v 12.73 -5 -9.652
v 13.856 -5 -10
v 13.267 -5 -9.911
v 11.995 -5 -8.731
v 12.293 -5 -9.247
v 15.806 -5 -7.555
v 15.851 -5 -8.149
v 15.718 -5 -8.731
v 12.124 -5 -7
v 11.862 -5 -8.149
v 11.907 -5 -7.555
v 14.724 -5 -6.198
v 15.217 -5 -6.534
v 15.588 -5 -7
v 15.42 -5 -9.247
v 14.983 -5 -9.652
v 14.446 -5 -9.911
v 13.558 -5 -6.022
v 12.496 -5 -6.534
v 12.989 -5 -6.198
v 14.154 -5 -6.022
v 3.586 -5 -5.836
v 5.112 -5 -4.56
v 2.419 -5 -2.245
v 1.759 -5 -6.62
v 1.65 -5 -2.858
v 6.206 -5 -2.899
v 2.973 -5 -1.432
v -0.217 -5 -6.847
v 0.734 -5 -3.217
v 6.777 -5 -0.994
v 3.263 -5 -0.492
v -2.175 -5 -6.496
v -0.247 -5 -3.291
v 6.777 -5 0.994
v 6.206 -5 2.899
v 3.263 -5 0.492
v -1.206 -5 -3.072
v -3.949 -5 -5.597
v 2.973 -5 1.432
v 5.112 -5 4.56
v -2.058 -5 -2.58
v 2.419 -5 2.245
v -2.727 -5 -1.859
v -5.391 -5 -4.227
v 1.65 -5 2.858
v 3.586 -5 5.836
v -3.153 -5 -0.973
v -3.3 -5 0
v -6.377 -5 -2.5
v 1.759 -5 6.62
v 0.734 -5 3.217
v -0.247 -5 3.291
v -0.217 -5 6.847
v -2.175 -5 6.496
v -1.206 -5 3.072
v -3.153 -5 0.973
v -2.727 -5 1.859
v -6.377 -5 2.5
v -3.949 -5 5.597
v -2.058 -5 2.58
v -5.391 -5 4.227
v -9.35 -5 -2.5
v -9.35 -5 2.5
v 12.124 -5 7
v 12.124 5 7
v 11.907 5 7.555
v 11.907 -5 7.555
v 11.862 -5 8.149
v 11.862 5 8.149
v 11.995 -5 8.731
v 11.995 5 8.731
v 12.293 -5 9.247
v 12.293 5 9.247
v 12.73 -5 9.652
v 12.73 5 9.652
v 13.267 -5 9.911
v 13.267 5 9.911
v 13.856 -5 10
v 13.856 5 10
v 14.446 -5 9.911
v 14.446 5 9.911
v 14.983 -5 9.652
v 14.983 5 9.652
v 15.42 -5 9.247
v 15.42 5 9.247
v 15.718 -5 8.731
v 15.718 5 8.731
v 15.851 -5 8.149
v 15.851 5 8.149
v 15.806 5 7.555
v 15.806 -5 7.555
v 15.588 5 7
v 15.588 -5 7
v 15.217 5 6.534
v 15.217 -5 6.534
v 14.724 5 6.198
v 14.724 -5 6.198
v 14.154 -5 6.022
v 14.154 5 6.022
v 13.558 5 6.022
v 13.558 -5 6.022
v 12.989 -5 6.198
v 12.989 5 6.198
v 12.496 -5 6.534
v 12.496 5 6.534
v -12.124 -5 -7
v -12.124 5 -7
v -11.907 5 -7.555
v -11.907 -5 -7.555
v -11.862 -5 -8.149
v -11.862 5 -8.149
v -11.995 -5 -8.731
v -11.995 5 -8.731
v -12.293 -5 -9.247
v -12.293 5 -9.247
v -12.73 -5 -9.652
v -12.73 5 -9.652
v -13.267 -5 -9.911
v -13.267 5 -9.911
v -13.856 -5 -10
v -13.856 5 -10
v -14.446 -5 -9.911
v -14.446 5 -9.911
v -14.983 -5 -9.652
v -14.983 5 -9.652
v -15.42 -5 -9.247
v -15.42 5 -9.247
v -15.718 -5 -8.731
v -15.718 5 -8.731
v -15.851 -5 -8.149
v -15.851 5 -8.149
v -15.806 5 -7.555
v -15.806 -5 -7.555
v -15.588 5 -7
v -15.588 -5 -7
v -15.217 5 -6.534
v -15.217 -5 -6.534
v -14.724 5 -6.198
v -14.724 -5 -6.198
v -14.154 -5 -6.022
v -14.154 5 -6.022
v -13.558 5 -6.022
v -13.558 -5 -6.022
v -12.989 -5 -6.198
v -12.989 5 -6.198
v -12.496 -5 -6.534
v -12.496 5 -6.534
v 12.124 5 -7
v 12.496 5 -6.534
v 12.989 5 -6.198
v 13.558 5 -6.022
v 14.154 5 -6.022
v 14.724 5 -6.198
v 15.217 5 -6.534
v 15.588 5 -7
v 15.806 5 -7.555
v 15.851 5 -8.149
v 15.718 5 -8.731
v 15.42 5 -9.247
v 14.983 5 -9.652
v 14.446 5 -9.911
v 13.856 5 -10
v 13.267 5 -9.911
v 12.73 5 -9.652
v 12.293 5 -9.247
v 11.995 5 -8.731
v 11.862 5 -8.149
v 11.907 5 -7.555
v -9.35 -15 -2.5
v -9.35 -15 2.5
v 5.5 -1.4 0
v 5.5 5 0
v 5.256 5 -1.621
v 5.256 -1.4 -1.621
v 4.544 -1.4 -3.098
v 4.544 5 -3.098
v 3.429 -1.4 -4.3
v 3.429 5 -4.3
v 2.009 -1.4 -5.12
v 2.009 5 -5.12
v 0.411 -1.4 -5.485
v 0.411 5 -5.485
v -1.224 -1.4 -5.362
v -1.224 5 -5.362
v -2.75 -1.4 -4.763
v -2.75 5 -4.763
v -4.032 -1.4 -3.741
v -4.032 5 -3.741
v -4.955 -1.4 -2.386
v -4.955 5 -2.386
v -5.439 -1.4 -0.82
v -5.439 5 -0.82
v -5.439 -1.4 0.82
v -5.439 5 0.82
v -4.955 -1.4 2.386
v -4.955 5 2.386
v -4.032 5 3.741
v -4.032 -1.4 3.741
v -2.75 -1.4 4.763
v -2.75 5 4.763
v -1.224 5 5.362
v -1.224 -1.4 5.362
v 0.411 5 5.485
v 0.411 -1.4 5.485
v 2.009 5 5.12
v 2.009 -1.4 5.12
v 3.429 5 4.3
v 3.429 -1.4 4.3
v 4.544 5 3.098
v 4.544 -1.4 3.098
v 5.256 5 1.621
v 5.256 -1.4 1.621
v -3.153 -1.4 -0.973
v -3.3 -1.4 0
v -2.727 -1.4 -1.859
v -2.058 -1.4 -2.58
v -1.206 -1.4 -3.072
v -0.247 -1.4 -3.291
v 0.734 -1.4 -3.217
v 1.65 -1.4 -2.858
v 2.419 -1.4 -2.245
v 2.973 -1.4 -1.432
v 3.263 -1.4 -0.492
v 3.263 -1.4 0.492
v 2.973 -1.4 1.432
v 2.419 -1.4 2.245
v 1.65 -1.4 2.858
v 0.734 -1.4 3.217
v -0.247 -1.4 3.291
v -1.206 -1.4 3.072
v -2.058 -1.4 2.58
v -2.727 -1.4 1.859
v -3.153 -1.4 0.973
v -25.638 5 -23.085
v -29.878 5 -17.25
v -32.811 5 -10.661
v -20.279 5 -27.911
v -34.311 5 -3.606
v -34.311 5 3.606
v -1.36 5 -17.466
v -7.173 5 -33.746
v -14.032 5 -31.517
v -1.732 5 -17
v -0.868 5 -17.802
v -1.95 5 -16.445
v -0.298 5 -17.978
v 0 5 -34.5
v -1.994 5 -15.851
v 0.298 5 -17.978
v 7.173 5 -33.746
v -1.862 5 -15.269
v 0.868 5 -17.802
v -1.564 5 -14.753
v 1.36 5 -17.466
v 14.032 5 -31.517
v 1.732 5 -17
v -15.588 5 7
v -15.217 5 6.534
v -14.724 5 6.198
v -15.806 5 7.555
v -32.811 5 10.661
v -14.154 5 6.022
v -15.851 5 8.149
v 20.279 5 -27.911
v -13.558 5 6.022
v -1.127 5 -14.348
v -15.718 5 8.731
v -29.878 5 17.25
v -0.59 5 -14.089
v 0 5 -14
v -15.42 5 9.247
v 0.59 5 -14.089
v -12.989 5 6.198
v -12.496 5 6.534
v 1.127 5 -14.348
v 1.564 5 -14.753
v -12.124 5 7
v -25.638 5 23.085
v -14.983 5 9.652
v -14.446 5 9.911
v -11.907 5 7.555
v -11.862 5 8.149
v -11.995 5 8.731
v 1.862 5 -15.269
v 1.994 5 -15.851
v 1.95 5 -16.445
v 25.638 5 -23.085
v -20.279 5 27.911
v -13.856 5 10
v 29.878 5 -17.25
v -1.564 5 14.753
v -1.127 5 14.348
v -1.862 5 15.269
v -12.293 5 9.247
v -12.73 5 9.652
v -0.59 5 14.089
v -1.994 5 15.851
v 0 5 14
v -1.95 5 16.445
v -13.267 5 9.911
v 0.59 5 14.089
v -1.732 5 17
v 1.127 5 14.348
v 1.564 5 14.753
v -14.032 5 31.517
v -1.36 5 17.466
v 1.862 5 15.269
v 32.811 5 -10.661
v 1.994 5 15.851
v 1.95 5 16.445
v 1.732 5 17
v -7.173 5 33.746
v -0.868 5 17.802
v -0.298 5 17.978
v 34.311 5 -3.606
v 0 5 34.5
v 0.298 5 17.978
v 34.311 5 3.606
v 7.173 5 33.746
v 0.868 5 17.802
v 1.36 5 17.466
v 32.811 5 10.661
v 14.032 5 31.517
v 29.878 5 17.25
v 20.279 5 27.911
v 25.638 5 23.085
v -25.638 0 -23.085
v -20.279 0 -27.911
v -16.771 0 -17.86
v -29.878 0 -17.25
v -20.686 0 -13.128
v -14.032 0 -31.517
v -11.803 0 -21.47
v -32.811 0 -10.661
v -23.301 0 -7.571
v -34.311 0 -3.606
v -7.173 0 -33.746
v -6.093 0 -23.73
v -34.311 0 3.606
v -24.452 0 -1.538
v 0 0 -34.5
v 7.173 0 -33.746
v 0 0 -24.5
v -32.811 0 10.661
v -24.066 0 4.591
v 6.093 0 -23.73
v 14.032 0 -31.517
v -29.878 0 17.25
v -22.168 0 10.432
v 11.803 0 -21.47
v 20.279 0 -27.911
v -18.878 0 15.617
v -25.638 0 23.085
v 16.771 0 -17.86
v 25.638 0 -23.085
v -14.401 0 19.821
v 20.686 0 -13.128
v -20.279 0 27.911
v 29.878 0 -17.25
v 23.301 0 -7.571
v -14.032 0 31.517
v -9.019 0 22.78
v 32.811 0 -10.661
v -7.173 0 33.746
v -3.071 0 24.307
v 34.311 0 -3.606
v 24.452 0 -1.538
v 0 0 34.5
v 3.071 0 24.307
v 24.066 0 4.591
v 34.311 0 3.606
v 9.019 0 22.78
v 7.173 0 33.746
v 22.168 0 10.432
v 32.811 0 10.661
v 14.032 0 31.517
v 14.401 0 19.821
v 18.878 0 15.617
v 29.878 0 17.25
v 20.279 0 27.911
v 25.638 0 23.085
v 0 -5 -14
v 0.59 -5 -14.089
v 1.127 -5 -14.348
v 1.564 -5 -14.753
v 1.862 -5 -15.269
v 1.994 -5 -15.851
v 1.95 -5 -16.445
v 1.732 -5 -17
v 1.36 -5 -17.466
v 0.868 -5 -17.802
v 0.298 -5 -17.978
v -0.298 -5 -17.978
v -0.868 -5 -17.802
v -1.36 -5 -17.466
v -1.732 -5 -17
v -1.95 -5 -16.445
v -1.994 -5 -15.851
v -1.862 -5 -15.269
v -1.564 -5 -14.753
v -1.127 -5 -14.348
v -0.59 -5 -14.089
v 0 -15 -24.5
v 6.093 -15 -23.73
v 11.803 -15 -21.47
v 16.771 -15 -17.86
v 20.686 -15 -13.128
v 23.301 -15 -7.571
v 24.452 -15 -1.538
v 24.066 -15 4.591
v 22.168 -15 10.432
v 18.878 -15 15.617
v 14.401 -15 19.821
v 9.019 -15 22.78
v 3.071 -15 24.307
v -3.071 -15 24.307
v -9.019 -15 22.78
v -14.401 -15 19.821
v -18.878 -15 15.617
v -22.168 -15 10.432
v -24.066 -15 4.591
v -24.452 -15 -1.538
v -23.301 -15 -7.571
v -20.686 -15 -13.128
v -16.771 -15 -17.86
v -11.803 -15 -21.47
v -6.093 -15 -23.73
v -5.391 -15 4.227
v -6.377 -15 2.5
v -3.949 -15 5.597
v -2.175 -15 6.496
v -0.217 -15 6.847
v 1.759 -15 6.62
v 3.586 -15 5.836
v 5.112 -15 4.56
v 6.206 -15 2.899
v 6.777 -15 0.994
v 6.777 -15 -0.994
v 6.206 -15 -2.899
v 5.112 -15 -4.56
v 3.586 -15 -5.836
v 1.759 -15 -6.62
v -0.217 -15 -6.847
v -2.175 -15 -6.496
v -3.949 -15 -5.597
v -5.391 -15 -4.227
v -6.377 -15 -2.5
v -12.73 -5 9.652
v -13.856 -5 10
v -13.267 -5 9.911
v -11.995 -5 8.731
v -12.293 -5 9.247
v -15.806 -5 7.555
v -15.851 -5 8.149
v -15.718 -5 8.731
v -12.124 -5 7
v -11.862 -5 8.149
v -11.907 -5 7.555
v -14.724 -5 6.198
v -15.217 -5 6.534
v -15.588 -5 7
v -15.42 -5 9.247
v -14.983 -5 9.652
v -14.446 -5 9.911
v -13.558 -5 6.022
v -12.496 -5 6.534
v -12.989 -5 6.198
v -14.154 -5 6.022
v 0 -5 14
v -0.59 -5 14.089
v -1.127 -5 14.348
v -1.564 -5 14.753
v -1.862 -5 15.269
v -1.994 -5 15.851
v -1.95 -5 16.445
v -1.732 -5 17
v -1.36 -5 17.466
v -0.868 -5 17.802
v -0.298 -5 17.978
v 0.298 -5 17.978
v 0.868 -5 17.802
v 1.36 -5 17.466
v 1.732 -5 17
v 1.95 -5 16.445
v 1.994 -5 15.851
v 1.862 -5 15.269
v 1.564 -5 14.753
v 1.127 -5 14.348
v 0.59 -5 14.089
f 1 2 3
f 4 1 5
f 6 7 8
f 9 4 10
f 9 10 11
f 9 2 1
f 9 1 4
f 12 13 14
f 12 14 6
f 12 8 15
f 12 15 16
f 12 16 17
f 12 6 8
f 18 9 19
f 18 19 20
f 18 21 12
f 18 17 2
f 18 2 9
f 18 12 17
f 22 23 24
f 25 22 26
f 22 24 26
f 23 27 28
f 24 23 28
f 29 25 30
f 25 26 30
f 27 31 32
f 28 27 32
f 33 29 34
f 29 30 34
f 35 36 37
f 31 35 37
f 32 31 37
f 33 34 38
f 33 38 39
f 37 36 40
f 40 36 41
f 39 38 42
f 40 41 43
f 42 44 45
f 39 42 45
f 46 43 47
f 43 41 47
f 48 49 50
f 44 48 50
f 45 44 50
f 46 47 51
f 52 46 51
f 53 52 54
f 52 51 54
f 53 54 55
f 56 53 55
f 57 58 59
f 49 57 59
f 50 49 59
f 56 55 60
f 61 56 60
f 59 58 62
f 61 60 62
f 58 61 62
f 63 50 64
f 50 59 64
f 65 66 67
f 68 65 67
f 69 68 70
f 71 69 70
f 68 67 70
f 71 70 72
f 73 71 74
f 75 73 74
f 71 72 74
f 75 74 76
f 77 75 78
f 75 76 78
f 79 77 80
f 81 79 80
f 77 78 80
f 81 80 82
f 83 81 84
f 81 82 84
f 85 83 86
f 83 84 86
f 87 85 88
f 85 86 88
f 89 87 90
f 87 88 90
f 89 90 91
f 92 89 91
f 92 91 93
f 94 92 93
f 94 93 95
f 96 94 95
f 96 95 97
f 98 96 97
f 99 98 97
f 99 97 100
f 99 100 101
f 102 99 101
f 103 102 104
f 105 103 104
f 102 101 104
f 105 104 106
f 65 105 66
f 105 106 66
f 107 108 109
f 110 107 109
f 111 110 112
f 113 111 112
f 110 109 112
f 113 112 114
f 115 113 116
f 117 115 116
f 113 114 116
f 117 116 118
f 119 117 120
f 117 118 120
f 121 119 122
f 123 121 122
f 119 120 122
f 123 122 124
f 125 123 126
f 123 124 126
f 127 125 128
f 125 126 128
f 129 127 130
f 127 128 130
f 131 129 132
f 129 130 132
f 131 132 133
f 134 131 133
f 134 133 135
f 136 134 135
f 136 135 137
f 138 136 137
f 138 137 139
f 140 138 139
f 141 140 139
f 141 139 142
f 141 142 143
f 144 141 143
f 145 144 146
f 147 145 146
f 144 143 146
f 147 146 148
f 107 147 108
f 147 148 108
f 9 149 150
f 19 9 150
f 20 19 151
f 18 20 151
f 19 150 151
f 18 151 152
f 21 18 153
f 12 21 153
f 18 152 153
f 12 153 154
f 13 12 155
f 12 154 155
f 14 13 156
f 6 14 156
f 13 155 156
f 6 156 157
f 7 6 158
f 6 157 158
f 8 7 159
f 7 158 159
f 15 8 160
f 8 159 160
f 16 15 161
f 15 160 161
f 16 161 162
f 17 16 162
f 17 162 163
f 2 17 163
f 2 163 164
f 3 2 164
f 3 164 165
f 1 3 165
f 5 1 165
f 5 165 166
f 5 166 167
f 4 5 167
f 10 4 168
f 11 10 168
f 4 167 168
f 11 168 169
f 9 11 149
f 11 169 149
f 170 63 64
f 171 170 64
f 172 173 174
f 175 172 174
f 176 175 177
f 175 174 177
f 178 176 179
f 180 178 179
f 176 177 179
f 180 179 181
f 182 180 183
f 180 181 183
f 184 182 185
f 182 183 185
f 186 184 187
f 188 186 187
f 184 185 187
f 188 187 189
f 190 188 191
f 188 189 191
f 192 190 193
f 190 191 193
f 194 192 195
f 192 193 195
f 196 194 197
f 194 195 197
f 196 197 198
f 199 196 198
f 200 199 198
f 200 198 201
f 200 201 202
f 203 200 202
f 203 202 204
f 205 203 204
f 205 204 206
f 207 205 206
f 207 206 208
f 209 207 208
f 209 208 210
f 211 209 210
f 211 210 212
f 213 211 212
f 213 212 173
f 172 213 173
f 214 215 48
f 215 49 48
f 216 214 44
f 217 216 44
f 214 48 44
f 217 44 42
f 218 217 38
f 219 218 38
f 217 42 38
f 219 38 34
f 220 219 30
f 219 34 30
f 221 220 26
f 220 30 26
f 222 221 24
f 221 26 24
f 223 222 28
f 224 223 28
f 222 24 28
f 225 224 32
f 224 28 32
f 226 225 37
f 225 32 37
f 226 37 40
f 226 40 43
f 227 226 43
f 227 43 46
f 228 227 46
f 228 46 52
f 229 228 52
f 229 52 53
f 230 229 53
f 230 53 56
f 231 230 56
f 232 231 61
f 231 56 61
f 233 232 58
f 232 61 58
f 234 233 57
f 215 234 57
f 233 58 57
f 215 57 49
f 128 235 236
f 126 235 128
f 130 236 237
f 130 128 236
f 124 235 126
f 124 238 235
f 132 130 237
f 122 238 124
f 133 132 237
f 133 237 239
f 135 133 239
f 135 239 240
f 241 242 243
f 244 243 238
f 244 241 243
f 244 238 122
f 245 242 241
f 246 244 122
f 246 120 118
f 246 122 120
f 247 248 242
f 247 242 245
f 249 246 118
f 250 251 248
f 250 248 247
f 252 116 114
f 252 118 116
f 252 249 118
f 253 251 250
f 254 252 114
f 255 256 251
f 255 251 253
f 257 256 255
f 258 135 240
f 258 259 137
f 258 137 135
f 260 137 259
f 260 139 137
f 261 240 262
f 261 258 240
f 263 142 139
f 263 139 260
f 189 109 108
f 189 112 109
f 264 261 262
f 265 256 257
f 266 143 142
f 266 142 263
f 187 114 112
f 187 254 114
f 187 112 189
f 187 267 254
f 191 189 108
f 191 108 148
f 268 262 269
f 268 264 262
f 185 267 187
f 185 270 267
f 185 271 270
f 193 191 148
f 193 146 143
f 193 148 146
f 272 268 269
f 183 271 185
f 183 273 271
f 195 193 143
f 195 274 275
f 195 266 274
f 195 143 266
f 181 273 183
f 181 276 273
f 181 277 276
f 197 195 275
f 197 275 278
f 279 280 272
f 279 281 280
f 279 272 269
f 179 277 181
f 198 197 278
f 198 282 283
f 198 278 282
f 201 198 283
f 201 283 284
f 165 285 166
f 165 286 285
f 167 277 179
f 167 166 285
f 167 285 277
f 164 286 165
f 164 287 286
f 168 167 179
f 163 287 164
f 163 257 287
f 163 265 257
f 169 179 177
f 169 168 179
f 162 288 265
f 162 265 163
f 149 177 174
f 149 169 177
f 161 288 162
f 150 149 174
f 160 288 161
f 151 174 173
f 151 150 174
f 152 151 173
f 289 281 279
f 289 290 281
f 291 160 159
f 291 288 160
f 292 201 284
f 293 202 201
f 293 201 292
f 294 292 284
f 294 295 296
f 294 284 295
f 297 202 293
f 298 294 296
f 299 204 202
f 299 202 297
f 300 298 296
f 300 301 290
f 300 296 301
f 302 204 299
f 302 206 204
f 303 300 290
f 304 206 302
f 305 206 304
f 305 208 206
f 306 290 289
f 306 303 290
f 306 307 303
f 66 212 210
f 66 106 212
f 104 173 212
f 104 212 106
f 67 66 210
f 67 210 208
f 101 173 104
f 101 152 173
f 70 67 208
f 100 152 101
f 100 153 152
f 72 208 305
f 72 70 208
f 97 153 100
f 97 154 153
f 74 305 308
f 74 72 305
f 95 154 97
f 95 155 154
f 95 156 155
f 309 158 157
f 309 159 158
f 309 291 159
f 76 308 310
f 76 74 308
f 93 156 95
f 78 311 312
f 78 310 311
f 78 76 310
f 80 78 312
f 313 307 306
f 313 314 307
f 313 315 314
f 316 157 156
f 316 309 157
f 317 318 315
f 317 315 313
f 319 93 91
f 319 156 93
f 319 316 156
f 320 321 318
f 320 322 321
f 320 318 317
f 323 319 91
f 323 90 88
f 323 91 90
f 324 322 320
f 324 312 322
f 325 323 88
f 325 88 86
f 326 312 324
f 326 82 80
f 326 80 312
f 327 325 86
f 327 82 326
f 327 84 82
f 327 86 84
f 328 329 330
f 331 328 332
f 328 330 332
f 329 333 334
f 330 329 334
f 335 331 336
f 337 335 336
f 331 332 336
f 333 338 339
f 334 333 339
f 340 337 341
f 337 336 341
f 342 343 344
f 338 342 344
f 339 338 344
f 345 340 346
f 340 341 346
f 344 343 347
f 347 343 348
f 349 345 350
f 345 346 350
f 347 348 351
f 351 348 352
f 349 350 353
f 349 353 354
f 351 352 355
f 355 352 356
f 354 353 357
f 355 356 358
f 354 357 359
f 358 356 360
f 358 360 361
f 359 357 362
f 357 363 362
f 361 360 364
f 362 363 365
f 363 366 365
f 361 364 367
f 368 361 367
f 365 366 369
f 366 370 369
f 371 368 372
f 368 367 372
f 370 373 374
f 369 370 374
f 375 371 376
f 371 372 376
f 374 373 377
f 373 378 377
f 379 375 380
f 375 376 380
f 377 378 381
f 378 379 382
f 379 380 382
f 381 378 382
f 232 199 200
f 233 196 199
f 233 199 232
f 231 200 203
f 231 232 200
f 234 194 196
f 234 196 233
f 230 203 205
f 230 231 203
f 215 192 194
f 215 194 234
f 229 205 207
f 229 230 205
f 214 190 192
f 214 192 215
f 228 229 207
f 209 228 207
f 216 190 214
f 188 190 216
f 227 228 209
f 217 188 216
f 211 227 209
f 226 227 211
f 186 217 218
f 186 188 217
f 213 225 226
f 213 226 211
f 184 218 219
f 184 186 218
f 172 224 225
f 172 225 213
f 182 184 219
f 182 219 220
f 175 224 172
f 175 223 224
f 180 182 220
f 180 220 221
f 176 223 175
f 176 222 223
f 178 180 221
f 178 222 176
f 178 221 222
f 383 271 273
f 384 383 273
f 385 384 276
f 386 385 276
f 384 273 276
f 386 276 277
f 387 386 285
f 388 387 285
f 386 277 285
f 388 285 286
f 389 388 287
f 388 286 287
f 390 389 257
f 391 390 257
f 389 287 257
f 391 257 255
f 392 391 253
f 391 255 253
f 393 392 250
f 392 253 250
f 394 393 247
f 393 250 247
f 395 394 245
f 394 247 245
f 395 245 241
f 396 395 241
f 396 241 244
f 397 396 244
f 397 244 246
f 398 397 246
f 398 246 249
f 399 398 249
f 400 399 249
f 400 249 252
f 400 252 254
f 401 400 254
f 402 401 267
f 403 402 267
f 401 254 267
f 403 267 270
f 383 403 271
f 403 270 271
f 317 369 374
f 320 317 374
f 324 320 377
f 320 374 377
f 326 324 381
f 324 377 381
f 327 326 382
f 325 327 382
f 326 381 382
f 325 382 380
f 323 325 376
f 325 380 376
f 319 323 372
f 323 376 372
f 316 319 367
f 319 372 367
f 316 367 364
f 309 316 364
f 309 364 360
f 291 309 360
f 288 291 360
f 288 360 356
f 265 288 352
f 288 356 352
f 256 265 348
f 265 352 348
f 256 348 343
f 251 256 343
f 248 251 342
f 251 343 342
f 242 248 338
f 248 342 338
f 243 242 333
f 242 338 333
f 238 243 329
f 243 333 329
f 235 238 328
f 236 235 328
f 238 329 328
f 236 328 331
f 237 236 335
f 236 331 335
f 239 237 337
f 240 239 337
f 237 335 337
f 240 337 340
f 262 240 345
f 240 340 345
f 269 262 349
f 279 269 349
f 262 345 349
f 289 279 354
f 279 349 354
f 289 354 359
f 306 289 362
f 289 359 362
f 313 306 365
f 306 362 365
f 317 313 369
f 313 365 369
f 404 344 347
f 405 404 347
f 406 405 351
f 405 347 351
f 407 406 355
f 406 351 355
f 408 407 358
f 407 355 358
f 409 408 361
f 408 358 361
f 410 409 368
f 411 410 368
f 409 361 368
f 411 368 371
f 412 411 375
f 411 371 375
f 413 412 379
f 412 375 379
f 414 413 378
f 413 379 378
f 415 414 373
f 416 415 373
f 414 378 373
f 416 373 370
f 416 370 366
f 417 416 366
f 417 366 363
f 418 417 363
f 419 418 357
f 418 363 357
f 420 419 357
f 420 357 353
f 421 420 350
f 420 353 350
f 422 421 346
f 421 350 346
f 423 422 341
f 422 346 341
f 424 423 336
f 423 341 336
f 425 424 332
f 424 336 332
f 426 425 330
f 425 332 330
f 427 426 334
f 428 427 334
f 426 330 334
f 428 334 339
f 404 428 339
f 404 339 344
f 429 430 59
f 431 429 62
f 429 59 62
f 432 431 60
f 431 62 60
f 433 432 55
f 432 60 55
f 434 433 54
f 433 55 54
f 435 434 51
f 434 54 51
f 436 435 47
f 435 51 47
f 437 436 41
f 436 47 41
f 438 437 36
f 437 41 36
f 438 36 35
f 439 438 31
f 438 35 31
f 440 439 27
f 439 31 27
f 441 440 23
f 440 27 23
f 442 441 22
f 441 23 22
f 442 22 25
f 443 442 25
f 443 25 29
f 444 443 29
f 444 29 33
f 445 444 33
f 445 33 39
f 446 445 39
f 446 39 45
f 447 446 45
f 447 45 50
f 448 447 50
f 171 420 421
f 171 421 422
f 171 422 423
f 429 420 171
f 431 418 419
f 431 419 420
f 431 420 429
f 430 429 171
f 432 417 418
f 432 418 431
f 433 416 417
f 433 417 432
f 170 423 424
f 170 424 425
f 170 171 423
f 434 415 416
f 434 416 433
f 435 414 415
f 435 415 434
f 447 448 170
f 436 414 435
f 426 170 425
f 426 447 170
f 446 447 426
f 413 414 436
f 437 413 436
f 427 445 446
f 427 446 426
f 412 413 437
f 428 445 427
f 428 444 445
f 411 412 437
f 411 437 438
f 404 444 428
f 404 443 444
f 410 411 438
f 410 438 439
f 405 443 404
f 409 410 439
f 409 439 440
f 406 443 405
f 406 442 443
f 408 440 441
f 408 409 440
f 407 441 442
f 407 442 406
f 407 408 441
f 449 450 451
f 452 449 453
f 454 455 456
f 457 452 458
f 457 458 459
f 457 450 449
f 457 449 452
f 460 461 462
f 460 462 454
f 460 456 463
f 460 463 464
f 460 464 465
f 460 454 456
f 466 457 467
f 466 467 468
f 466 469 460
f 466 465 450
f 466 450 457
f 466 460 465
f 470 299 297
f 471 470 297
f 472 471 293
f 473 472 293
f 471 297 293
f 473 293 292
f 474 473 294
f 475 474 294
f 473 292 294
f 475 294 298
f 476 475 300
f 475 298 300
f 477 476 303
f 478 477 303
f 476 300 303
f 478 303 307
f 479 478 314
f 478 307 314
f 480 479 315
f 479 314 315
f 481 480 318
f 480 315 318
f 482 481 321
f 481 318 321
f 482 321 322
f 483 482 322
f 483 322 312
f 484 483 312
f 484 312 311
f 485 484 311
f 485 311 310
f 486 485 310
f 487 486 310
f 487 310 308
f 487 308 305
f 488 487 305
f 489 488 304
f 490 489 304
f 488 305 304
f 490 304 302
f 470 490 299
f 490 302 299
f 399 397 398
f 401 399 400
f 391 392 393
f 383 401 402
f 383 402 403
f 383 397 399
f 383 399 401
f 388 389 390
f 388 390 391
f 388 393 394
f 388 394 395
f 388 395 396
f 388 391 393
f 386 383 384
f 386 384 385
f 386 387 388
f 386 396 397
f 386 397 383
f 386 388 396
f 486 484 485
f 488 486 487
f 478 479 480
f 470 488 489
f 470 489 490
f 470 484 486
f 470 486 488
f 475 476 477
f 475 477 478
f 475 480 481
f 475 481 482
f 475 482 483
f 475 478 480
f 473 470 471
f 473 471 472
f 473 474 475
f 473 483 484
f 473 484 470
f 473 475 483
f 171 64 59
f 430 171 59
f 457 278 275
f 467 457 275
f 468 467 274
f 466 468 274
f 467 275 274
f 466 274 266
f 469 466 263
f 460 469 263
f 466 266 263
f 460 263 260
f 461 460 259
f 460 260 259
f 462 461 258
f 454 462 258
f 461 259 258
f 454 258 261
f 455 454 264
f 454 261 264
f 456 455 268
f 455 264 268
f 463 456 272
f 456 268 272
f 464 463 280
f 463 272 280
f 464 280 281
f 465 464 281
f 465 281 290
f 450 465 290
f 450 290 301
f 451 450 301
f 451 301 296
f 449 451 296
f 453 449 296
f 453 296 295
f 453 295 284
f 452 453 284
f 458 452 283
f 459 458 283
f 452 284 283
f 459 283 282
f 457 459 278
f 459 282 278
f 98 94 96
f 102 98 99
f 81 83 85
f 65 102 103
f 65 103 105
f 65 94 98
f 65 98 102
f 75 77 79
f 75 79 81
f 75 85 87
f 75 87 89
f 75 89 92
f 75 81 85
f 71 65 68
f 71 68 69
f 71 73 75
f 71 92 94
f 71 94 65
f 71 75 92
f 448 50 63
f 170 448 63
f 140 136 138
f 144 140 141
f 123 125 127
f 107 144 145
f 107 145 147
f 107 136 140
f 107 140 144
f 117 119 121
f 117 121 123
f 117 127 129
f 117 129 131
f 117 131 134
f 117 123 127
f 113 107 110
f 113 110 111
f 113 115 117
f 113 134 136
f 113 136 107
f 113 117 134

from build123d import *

# Parameters (mm, degrees)
CROQUIS1_R                                          = 34.5
SALIENTE_EXTRUIR1_DEPTH                             = 5
CROQUIS2_R                                          = 24.5
SALIENTE_EXTRUIR2_DEPTH                             = 15
CROQUIS3_R                                          = 6.85
SALIENTE_EXTRUIR3_DEPTH                             = 30
CROQUIS4_R                                          = 2
CORTAR_EXTRUIR1_DEPTH                               = 10
MATRIZC1_COUNT                                      = 6
CORTAR_EXTRUIR2_START                               = -30
CORTAR_EXTRUIR2_DEPTH                               = 30
CUT_EXTRUDE1_START                                  = -40
CUT_EXTRUDE1_DEPTH                                  = 40
CBORE_FOR_M6_HEX_SOCKET_HEAD_CAP_SCREW1_D           = 6.6
CBORE_FOR_M6_HEX_SOCKET_HEAD_CAP_SCREW1_CBORE_D     = 11
CBORE_FOR_M6_HEX_SOCKET_HEAD_CAP_SCREW1_CBORE_DEPTH = 6.4


with BuildPart() as part:
    # Croquis1 → Saliente-Extruir1 (new body)
    with BuildSketch(Plane(origin=(0, 0, 0), x_dir=(1, 0, 0), z_dir=(0, 1, 0))):
        with Locations(Location((0, 0, 0), (0, 0, 270))):
            Circle(CROQUIS1_R)
    extrude(amount=SALIENTE_EXTRUIR1_DEPTH)

    # Croquis2 → Saliente-Extruir2 (add)
    with BuildSketch(Plane.XZ):
        with Locations(Location((0, 0, 0), (0, 0, 270))):
            Circle(CROQUIS2_R)
    extrude(amount=SALIENTE_EXTRUIR2_DEPTH)

    # Croquis3 → Saliente-Extruir3 (add)
    with BuildSketch(Plane.XZ.offset(15)):
        with Locations(Location((0, 0, 0), (0, 0, 270))):
            Circle(CROQUIS3_R)
    extrude(amount=SALIENTE_EXTRUIR3_DEPTH)

    # Croquis4 → Cortar-Extruir1 (cut)
    with BuildSketch(Plane(origin=(0, 5, 0), x_dir=(1, 0, 0), z_dir=(0, 1, 0))):
        with Locations(Location((0, 16, 0), (0, 0, 270))):
            Circle(CROQUIS4_R)
    cortar_extruir1 = extrude(amount=-CORTAR_EXTRUIR1_DEPTH, mode=Mode.SUBTRACT)

    # MatrizC1: Cortar-Extruir1 ×6 about axis
    matrizc1_axis = Axis((0, 0, 0), (0, 1, 0))
    for i in range(1, MATRIZC1_COUNT):
        add(cortar_extruir1.rotate(matrizc1_axis, i * 360 / MATRIZC1_COUNT), mode=Mode.SUBTRACT)

    # Croquis7 → Cortar-Extruir2 (cut)
    with BuildSketch(Plane.XZ.offset(45).offset(CORTAR_EXTRUIR2_START)):
        with BuildLine():
            Line((-6.37749951, 2.5), (-3.47749951, 2.5))
            Line((-3.47749951, 2.5), (-3.47749951, -2.5))
            Line((-3.47749951, -2.5), (-6.37749951, -2.5))
            ThreePointArc((-6.37749951, -2.5), (-6.85, 0), (-6.37749951, 2.5))
        make_face()
    extrude(amount=CORTAR_EXTRUIR2_DEPTH, mode=Mode.SUBTRACT)

    # Sketch1 → Cut-Extrude1 (cut)
    with BuildSketch(Plane.XZ.offset(45).offset(CUT_EXTRUDE1_START)):
        with BuildLine():
            Line((-6.37749951, -2.5), (-9.35, -2.5))
            Line((-9.35, -2.5), (-9.35, 2.5))
            Line((-9.35, 2.5), (-6.37749951, 2.5))
            ThreePointArc((-6.37749951, 2.5), (6.85, 0), (-6.37749951, -2.5))
        make_face()
    extrude(amount=CUT_EXTRUDE1_DEPTH, mode=Mode.SUBTRACT)

    # CBORE for M6 Hex Socket Head Cap Screw1 (through all)
    with Locations(Plane(origin=(0, 5, 0), x_dir=(1, 0, 0), z_dir=(0, 1, 0))):
        with Locations((0, 0)):
            CounterBoreHole(CBORE_FOR_M6_HEX_SOCKET_HEAD_CAP_SCREW1_D / 2, CBORE_FOR_M6_HEX_SOCKET_HEAD_CAP_SCREW1_CBORE_D / 2, CBORE_FOR_M6_HEX_SOCKET_HEAD_CAP_SCREW1_CBORE_DEPTH)


solid = part.part
